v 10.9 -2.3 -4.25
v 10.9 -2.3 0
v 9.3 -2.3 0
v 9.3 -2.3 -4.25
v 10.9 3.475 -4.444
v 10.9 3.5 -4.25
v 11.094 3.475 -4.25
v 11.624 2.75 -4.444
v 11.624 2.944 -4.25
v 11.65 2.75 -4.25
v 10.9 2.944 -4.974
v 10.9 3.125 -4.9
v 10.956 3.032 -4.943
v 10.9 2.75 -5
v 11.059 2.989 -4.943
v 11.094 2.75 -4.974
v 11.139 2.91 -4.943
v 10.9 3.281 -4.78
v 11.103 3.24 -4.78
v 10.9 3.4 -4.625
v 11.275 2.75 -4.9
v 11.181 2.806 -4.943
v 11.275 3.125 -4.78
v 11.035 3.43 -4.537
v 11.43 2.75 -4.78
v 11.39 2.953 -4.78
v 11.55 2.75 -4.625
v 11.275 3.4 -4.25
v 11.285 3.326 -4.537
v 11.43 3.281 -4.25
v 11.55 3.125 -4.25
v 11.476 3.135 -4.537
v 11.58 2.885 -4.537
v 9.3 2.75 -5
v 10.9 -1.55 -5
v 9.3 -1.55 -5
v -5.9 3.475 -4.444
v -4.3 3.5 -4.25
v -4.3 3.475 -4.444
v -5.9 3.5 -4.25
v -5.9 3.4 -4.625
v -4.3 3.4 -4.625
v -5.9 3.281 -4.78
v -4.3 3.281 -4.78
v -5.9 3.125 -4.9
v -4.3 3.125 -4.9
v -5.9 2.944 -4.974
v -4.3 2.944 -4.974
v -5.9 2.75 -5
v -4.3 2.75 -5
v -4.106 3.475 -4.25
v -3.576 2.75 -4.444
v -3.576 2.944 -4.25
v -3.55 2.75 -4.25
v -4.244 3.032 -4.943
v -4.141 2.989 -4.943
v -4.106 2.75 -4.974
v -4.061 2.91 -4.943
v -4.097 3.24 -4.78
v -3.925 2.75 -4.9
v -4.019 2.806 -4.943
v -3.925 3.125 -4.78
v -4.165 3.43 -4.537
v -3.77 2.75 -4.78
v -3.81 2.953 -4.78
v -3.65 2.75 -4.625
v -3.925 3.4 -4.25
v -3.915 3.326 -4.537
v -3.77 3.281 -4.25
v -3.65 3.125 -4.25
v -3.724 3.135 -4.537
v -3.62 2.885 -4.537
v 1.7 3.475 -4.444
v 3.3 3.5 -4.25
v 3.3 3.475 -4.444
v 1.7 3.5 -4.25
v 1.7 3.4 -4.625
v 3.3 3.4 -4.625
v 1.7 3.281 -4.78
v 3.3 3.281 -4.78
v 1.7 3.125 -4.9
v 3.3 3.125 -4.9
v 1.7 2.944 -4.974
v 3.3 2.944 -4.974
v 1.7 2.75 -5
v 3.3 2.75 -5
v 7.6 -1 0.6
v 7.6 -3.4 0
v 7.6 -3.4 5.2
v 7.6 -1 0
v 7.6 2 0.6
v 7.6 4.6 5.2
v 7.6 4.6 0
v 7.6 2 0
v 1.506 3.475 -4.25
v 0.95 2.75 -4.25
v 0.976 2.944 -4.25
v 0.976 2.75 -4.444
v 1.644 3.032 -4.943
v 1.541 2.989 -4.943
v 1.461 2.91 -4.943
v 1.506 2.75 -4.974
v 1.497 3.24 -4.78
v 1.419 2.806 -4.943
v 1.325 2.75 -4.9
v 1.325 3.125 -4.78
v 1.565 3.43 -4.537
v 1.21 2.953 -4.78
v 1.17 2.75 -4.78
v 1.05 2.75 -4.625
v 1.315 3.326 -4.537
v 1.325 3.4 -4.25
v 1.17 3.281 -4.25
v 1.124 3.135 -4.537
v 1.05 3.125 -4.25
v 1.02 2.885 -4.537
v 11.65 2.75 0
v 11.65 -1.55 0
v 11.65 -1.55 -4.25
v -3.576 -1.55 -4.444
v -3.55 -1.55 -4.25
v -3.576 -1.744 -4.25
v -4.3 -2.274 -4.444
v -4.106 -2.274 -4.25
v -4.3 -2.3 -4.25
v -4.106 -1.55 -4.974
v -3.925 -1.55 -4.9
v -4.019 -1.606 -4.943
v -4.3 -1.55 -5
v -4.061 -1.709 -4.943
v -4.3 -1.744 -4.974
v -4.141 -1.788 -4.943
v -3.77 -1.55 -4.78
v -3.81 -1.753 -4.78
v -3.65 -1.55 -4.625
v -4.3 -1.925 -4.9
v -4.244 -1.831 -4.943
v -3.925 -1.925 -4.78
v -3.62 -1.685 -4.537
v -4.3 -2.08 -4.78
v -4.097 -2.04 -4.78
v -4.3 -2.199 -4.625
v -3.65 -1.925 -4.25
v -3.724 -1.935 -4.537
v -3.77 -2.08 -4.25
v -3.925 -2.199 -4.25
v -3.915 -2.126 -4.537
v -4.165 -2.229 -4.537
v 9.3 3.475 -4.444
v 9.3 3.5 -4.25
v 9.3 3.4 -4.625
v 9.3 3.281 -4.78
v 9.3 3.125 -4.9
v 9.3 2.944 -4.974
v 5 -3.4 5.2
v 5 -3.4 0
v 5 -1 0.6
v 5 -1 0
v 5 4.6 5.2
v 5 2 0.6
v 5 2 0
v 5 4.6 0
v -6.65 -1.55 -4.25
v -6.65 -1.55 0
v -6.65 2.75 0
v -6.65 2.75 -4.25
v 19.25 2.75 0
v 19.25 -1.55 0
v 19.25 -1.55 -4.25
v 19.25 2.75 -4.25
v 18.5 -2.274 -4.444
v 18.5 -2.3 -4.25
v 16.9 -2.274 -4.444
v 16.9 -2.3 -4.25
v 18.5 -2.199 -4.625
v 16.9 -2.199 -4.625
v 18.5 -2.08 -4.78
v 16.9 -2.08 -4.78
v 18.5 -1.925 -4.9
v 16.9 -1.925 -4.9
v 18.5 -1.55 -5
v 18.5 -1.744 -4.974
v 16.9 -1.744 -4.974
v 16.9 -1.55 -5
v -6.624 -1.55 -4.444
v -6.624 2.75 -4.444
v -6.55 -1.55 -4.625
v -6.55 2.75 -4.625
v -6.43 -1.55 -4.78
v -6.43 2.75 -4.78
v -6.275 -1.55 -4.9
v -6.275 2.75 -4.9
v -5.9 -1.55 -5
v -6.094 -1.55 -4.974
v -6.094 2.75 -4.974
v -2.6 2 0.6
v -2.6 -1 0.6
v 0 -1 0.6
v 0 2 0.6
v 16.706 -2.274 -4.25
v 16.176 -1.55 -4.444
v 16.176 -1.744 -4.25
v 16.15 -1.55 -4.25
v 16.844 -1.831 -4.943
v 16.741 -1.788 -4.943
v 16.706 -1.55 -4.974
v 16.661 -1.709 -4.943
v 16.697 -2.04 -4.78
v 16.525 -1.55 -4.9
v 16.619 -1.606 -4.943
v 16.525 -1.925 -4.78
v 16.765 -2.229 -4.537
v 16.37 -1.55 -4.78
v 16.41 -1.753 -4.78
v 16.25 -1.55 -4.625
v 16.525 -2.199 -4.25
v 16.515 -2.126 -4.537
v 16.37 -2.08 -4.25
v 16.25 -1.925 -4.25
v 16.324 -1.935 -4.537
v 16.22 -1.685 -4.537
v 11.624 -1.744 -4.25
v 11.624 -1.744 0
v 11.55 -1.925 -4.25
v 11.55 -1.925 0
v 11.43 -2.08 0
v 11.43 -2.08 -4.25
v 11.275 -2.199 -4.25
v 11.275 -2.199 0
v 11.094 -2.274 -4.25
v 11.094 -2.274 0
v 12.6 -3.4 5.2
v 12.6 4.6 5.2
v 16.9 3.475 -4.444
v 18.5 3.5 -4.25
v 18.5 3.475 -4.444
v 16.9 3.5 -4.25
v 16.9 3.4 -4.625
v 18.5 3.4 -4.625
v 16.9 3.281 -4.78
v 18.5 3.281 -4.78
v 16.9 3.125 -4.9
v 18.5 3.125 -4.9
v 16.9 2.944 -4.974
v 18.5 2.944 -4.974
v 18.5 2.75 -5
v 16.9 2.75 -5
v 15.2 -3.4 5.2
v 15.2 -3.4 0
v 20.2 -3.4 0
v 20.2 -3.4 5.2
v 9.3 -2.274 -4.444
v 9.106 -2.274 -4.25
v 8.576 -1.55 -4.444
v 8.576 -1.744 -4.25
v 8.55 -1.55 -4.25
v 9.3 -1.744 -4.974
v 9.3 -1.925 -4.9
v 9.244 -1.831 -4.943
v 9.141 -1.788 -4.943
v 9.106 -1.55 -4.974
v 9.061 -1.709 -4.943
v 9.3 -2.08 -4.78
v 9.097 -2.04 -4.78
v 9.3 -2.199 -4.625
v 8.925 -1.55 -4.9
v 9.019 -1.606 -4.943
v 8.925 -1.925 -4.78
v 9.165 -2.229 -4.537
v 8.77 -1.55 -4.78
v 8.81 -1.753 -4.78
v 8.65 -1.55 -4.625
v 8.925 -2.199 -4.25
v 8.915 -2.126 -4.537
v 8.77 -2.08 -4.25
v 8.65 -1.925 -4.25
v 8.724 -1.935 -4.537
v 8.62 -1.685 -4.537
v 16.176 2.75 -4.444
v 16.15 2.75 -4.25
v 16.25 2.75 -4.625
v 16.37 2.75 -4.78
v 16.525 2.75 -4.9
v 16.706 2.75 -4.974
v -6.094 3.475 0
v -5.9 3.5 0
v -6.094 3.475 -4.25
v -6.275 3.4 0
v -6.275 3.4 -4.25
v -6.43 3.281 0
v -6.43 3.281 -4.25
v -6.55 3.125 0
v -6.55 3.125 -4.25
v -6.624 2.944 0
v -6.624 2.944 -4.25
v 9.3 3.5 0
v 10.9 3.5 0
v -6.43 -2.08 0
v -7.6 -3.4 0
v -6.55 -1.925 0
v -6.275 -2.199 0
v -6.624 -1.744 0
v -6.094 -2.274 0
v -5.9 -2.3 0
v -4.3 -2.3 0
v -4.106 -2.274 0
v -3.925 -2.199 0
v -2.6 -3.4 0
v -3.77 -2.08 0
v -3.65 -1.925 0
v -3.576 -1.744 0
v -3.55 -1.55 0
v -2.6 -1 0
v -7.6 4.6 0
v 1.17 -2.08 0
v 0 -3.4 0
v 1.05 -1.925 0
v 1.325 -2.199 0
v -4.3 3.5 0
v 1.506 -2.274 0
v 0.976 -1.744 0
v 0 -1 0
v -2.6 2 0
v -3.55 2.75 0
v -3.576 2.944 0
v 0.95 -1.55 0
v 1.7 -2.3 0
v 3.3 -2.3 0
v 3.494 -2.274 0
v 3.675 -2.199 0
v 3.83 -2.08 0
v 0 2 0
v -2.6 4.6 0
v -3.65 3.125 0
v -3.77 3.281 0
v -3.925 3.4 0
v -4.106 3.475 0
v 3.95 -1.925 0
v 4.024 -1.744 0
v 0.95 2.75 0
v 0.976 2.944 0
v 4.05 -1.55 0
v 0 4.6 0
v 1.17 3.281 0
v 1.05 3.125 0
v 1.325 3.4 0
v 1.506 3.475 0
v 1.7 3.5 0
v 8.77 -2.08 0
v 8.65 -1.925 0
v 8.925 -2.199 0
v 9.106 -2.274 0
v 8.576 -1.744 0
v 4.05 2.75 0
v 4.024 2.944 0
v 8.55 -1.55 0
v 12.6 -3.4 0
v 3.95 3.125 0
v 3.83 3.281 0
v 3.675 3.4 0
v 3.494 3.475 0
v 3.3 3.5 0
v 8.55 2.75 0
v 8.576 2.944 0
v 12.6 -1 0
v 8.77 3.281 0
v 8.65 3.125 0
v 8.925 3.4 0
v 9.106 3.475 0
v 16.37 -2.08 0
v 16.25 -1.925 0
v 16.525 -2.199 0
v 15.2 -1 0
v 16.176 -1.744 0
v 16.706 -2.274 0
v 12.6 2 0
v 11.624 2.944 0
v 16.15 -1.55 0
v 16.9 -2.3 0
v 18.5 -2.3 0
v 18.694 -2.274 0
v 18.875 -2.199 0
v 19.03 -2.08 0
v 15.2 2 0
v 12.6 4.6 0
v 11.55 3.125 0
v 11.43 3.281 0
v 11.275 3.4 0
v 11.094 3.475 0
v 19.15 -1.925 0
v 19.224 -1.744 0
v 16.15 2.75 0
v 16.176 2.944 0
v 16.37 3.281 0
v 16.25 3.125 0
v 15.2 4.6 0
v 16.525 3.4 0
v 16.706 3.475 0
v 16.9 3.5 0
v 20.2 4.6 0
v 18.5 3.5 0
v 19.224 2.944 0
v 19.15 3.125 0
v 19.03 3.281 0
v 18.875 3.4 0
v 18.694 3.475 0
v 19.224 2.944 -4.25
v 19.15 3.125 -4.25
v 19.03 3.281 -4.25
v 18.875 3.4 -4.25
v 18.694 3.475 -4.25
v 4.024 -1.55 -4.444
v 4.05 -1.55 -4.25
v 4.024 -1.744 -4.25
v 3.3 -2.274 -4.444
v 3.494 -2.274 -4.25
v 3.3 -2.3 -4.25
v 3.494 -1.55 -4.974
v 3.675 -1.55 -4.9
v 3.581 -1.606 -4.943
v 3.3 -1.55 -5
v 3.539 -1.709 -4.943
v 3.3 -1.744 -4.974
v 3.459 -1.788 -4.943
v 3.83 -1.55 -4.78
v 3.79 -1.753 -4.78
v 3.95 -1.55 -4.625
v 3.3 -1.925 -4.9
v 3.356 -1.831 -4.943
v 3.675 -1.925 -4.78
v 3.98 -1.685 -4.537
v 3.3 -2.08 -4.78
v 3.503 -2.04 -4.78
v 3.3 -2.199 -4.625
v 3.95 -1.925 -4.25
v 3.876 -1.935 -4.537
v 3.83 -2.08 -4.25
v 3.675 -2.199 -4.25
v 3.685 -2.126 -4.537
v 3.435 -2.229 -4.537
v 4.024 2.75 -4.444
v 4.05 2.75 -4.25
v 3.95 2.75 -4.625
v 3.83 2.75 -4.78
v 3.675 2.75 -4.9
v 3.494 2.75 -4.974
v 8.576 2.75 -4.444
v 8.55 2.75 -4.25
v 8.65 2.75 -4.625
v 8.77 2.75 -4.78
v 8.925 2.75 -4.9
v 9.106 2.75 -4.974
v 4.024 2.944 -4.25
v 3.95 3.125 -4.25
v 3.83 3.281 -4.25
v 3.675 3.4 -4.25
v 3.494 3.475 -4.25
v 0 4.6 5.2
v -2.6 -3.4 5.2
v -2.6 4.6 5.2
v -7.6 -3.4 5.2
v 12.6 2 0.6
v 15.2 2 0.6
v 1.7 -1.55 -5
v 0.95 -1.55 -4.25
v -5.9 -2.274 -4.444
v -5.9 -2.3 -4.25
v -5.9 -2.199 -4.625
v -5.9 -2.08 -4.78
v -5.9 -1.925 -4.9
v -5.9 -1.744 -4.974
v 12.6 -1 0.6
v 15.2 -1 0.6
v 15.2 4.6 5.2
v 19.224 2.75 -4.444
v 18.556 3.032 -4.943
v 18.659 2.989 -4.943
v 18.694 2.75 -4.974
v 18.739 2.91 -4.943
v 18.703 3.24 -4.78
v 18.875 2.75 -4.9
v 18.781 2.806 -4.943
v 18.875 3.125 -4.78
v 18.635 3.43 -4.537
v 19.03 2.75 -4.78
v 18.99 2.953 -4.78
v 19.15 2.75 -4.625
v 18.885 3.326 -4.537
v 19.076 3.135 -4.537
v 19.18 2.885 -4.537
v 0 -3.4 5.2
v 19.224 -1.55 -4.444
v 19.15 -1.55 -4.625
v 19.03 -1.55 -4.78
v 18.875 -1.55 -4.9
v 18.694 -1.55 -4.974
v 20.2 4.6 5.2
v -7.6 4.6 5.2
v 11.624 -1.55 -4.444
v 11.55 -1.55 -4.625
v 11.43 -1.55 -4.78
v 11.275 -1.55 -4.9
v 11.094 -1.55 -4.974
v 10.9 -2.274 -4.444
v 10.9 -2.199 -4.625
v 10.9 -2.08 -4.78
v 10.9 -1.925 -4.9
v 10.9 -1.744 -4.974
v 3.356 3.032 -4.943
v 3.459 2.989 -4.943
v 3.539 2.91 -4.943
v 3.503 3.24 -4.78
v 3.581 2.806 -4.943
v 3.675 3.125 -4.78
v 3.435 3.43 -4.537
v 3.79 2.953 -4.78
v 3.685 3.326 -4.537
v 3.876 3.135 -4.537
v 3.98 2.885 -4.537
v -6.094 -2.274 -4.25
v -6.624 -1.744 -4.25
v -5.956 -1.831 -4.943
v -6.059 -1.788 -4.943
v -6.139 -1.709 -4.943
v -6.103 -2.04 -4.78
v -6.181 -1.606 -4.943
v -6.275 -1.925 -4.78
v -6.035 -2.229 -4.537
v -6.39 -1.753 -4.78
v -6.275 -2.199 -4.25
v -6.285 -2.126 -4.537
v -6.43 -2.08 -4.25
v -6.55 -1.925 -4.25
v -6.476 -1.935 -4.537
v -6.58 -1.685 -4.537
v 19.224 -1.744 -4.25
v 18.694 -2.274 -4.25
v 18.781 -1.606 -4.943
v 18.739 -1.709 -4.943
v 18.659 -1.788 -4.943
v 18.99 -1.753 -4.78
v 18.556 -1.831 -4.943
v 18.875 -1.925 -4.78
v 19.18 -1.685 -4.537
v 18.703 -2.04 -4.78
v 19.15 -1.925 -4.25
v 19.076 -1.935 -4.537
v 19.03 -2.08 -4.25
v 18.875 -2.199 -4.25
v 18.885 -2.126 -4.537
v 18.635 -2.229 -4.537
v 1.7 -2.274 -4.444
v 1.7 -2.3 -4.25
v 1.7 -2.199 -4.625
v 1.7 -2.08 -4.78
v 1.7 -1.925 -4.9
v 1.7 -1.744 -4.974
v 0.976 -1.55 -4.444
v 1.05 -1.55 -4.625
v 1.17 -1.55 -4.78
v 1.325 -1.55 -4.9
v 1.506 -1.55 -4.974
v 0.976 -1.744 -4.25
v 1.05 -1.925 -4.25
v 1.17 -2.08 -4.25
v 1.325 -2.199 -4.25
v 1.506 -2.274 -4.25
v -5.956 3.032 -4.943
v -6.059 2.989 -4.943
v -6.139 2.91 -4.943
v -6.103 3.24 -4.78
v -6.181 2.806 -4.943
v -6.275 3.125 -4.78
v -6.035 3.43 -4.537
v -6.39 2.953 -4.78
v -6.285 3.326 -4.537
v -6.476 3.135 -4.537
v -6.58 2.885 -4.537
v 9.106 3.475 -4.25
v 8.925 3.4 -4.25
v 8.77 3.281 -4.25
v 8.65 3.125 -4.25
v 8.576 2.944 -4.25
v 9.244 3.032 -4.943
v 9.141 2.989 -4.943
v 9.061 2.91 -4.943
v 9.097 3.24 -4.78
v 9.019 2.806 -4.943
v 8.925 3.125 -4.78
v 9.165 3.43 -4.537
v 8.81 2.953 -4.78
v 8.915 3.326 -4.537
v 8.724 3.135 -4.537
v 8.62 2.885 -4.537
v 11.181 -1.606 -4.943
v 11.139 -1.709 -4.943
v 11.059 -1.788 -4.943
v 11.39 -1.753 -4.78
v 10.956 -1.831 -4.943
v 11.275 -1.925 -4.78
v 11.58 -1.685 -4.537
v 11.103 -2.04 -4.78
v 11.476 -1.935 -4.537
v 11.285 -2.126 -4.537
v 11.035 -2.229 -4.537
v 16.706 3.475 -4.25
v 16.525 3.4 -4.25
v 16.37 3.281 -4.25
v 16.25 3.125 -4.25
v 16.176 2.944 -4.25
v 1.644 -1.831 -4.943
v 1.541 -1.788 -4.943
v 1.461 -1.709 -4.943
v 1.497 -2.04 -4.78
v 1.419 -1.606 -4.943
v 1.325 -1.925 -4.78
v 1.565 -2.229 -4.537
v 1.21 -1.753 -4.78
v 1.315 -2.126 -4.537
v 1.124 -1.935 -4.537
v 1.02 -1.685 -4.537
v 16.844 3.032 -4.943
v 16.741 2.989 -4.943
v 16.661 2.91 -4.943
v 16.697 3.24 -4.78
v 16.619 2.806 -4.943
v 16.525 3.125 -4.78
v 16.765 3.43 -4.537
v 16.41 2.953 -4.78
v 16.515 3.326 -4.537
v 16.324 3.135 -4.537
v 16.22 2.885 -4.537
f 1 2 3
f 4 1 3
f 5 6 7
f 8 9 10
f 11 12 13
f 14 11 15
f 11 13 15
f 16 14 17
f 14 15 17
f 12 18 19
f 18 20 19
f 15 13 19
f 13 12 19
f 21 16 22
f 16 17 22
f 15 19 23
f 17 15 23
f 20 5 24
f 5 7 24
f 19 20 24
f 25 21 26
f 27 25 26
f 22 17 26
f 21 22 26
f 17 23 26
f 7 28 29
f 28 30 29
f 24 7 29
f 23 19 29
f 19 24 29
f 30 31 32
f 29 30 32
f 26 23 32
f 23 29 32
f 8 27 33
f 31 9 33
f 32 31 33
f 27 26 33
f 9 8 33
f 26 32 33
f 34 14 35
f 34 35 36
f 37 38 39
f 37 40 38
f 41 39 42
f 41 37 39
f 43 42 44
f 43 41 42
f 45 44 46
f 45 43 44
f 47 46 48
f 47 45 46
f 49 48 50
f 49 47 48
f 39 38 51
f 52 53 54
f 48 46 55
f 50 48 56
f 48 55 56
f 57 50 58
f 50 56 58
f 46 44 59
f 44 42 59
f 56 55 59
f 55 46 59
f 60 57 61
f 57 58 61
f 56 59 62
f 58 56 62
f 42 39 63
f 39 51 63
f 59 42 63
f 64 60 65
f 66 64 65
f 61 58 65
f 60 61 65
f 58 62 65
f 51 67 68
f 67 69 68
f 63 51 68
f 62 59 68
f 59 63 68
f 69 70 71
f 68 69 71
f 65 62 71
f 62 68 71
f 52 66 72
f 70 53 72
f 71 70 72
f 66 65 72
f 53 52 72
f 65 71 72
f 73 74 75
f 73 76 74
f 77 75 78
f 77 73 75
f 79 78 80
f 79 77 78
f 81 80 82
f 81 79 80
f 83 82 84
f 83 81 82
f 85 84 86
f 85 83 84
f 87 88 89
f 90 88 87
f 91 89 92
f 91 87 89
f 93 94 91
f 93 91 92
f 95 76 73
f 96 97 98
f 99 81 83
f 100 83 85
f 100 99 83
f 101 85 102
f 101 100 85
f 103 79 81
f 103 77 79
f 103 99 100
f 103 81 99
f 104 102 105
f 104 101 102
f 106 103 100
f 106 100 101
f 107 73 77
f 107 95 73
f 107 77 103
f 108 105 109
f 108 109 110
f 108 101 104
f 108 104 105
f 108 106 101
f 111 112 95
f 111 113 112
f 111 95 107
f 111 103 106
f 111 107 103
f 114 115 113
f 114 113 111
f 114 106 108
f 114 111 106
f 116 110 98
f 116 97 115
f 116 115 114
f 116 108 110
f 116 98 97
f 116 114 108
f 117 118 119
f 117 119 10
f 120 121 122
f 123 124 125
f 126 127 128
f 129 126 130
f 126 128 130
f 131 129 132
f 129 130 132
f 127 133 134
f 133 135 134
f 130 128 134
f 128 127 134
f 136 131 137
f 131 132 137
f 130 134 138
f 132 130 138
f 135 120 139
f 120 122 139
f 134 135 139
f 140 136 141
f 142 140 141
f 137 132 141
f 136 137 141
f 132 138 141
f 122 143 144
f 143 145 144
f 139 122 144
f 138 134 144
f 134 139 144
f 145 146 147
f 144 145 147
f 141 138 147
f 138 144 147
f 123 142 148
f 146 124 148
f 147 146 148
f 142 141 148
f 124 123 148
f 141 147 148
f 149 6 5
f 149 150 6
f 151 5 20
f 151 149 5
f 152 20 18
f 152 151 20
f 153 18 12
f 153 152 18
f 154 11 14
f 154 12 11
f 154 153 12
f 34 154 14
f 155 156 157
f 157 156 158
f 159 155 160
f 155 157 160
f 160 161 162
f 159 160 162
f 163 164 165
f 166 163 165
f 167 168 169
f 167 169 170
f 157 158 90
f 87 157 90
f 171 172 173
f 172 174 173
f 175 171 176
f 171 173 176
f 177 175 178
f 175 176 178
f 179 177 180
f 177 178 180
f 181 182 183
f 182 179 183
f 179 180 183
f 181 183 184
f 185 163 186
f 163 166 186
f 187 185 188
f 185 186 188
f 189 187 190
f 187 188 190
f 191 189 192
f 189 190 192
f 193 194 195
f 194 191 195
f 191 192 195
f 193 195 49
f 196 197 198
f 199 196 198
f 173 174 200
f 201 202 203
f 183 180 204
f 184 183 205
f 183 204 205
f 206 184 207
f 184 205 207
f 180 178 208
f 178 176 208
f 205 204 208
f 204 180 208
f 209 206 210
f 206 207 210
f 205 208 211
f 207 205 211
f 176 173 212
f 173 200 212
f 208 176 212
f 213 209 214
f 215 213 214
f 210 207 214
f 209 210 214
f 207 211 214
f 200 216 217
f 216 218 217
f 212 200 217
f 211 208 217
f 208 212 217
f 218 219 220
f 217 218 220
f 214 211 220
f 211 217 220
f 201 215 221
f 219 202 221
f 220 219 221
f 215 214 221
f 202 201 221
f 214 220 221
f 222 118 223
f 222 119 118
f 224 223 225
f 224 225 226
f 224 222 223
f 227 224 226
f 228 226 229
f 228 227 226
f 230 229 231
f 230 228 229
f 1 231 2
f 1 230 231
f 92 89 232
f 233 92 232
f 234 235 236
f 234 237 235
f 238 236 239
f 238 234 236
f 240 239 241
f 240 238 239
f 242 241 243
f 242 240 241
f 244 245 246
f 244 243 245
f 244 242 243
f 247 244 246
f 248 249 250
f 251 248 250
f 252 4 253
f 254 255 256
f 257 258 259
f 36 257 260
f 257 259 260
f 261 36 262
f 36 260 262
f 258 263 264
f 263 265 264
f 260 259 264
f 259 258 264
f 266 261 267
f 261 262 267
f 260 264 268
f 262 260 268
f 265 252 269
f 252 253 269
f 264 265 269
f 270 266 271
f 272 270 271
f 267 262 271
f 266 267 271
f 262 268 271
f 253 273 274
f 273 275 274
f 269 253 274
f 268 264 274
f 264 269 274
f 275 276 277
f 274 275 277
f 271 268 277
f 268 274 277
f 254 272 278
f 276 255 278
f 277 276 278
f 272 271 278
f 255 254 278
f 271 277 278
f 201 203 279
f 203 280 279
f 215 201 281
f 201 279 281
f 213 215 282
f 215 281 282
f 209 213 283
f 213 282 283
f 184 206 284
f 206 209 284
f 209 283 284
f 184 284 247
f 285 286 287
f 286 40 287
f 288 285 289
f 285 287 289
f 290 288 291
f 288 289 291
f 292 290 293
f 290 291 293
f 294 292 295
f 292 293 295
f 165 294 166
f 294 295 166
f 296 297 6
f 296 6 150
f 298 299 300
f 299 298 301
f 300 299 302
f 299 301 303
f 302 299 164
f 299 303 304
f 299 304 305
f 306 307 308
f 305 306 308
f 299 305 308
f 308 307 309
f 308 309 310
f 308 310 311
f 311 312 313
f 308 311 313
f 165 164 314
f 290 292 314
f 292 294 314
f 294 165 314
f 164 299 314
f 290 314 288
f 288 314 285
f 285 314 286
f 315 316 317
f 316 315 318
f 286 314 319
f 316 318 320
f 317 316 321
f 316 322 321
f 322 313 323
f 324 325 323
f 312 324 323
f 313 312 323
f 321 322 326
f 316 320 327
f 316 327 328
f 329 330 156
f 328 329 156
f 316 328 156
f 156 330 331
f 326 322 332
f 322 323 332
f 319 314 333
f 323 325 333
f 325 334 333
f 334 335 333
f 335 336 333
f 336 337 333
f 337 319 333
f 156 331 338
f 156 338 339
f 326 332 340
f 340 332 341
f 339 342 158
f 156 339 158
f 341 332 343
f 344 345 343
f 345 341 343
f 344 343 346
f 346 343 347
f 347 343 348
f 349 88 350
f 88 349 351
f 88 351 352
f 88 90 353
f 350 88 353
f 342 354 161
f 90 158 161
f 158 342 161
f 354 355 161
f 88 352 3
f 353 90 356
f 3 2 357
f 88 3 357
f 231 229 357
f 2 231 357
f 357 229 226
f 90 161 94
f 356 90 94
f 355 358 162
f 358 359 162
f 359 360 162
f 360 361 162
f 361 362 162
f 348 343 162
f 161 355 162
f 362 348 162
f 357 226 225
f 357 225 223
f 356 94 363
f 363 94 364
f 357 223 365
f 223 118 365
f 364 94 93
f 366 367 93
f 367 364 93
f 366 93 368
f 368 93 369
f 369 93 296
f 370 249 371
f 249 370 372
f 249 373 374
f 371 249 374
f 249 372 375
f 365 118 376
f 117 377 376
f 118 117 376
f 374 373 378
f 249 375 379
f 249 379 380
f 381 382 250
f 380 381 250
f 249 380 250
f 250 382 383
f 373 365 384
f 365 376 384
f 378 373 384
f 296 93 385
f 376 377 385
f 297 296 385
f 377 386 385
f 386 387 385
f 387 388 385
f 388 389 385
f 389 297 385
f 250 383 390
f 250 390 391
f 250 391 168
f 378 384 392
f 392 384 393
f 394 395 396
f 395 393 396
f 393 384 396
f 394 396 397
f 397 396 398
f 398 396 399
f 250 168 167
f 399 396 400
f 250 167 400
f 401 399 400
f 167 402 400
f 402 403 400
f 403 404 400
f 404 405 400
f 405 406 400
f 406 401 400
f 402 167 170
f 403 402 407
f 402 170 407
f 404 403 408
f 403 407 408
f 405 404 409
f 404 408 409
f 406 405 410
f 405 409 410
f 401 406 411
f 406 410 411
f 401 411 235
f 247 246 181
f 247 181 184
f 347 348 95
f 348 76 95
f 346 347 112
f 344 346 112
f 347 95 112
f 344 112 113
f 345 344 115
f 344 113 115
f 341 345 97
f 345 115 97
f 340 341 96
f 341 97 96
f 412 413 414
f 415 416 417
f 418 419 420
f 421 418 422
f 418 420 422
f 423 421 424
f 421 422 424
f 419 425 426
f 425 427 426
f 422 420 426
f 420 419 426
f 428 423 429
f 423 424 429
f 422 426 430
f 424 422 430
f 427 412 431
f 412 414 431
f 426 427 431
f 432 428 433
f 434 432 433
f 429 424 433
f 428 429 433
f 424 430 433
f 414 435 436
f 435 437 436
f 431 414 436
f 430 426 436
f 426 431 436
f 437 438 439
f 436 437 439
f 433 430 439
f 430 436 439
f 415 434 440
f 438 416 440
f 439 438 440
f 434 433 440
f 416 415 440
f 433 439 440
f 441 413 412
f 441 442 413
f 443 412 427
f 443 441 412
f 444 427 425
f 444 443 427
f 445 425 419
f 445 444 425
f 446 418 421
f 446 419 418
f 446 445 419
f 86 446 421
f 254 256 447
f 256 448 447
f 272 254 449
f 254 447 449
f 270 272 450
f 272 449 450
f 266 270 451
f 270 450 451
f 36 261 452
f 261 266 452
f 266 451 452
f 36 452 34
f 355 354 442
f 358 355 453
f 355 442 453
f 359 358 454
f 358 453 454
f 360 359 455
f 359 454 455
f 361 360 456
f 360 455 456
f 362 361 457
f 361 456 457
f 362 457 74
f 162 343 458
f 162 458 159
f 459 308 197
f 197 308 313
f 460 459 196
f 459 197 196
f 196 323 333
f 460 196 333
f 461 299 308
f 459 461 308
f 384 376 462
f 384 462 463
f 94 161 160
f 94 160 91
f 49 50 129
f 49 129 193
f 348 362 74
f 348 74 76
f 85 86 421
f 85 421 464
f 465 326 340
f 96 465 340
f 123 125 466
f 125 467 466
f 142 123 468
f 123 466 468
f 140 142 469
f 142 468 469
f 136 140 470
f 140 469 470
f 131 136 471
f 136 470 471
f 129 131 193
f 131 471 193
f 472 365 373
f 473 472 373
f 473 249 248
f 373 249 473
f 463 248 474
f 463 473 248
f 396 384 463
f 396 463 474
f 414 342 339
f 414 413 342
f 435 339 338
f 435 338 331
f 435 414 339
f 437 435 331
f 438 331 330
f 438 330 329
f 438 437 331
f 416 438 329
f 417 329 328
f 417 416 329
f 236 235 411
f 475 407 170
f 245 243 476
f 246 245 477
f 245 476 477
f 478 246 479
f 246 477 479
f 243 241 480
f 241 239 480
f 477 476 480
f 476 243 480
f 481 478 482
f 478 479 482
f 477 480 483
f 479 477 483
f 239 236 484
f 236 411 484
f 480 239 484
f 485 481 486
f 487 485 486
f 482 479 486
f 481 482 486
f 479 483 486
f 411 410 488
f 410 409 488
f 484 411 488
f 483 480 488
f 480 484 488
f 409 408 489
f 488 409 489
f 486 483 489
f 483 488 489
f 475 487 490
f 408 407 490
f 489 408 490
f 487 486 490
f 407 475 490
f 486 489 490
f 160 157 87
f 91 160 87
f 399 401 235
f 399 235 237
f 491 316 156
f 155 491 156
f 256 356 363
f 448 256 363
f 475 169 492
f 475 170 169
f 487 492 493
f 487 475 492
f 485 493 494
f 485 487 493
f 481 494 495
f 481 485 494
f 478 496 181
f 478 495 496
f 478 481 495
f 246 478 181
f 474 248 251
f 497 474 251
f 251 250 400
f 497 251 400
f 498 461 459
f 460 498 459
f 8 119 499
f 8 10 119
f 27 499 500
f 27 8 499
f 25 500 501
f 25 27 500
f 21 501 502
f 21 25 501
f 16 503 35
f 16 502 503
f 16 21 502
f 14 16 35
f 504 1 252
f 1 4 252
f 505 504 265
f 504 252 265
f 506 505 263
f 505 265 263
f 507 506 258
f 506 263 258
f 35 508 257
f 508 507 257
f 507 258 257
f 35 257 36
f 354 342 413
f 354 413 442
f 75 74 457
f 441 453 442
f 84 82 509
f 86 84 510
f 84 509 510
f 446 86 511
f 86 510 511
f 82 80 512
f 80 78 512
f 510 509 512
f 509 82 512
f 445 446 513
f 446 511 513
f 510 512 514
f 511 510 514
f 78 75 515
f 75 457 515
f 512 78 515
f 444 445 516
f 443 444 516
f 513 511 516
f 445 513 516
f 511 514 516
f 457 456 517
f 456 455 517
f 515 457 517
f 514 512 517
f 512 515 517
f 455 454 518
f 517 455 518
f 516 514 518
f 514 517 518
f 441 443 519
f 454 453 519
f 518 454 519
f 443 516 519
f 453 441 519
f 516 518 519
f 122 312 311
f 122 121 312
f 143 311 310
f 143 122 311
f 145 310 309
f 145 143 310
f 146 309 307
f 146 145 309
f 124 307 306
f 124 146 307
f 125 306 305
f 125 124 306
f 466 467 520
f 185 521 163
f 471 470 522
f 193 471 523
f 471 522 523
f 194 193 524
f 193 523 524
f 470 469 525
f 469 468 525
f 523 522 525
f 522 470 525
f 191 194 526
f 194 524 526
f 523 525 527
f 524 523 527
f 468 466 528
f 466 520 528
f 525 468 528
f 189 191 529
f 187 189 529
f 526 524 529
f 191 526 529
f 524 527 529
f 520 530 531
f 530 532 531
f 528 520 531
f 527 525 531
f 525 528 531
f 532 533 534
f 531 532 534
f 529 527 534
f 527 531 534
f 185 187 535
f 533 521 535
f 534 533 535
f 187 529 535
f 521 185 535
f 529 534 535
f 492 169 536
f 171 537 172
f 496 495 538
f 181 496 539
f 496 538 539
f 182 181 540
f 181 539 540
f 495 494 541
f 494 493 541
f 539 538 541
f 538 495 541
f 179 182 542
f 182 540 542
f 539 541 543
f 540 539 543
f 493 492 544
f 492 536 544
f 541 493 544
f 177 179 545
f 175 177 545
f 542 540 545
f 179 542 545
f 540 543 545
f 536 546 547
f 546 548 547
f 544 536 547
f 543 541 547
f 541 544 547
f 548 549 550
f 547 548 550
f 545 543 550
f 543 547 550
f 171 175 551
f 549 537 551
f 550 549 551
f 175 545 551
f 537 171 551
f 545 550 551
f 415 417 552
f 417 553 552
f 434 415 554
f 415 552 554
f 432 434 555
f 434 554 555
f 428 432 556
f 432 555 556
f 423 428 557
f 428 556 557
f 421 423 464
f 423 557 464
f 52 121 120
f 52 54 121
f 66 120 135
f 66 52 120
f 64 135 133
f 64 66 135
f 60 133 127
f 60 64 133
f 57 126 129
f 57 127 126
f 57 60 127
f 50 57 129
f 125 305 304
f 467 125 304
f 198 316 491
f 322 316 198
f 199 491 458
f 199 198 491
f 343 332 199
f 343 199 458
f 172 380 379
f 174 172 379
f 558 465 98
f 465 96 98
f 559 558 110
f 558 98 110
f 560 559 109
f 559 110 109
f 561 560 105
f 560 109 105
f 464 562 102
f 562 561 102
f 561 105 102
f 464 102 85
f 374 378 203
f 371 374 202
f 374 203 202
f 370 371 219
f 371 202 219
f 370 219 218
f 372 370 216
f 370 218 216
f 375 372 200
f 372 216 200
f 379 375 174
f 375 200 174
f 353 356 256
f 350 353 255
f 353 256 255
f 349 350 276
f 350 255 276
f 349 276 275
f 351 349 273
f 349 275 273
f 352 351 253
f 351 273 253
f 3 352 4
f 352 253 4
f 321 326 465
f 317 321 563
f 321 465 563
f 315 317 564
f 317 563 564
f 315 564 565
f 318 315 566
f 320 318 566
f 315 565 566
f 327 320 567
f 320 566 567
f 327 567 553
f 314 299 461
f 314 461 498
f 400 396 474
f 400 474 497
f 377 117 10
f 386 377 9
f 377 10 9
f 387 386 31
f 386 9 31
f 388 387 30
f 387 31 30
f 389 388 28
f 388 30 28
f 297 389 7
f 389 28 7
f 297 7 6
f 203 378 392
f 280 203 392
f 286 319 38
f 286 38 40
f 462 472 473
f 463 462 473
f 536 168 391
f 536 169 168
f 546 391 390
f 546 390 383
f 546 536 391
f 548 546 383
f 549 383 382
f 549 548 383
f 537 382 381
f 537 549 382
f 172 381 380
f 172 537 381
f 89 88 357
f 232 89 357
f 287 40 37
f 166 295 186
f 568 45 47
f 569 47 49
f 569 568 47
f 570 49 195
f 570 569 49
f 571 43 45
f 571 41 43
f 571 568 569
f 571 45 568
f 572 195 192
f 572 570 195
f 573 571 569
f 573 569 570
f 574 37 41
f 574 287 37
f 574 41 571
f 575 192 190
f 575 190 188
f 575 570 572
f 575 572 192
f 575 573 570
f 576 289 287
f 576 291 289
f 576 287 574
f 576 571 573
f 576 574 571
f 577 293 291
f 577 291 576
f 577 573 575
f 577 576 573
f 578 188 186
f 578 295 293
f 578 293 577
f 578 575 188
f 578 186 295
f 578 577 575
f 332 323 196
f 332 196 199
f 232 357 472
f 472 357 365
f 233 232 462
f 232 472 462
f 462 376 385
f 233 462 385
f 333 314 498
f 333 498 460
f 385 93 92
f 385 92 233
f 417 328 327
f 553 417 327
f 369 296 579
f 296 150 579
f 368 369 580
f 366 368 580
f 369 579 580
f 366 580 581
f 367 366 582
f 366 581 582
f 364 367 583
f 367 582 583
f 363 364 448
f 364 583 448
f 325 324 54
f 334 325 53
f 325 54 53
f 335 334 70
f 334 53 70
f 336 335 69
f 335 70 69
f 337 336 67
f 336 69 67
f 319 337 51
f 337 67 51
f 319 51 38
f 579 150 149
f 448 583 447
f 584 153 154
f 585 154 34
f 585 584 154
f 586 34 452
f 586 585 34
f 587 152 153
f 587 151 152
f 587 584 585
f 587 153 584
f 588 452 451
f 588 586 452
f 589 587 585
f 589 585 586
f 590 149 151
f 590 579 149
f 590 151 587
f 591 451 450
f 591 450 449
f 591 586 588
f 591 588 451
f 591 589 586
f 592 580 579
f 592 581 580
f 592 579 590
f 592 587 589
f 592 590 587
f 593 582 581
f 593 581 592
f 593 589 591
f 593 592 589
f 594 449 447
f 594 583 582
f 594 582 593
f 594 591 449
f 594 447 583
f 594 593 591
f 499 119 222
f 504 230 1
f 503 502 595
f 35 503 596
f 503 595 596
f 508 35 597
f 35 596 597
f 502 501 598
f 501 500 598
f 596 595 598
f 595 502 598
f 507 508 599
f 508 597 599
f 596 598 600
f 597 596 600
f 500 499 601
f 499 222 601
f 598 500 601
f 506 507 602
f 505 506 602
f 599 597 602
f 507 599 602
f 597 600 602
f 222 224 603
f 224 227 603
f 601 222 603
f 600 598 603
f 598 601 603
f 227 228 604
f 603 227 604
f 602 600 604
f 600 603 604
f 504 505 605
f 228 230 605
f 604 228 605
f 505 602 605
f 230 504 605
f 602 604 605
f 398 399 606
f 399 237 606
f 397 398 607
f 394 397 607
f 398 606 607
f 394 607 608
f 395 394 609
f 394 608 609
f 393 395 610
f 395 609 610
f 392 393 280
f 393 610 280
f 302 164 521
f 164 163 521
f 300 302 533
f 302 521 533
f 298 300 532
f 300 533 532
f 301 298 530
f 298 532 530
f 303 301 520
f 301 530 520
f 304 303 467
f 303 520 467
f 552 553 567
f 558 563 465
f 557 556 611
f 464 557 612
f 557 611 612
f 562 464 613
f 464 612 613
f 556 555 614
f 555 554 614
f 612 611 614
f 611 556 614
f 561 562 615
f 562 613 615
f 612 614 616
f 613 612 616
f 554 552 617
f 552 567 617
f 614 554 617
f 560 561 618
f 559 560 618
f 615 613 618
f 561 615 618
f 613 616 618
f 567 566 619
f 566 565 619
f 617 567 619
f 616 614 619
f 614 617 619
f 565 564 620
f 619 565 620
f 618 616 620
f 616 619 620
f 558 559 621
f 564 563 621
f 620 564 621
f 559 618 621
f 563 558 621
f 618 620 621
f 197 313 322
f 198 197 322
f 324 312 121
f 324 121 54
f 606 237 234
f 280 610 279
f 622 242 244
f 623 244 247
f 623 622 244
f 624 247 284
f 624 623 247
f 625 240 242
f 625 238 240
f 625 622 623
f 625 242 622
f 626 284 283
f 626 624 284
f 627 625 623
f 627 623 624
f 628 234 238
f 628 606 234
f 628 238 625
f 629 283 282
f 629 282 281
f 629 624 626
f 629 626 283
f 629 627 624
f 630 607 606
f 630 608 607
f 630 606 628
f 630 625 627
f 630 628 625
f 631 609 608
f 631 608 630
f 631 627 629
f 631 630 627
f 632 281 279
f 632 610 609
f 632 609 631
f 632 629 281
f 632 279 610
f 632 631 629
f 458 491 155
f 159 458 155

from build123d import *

# Parameters (mm, degrees)
SKETCH_1_W           = 5
SKETCH_1_H           = 8
EXTRUDE_1_DEPTH      = 5.2
EXTRUDE_1_2_DEPTH    = 5.2
EXTRUDE_1_3_DEPTH    = 5.2
EXTRUDE_1_4_DEPTH    = 5.2
SKETCH_2_W           = 3.1
SKETCH_2_H           = 5.8
EXTRUDE_2_DEPTH      = 5
EXTRUDE_3_DEPTH      = 2
EXTRUDE_3_DEPTH_BACK = 1
SKETCH_3_W           = 2.6
SKETCH_3_H           = 0.6
FILLET_1_R           = 0.75


with BuildPart() as part:
    # 草图1 → 凸台-拉伸1 (new body)
    with BuildSketch(Plane.XY):
        with Locations((2.5, 0.600266138)):
            Rectangle(SKETCH_1_W, SKETCH_1_H)
    extrude(amount=EXTRUDE_1_DEPTH)



with BuildPart() as body_2:
    # 草图1 → Extrude 1 2 (new body)
    with BuildSketch(Plane.XY):
        with Locations((-5.1, 0.600266138)):
            Rectangle(SKETCH_1_W, SKETCH_1_H)
    extrude(amount=EXTRUDE_1_2_DEPTH)


with BuildPart() as body_3:
    # 草图1 → Extrude 1 3 (new body)
    with BuildSketch(Plane.XY):
        with Locations((10.1, 0.600266138)):
            Rectangle(SKETCH_1_W, SKETCH_1_H)
    extrude(amount=EXTRUDE_1_3_DEPTH)


with BuildPart() as body_4:
    # 草图1 → Extrude 1 4 (new body)
    with BuildSketch(Plane.XY):
        with Locations((17.7, 0.600266138)):
            Rectangle(SKETCH_1_W, SKETCH_1_H)
    extrude(amount=EXTRUDE_1_4_DEPTH)


with BuildPart() as part_1:
    add(part.part)

    add(body_2.part)  # 凸台-拉伸2 merges body 2

    add(body_3.part)  # 凸台-拉伸2 merges body 3

    add(body_4.part)  # 凸台-拉伸2 merges body 4
    # 草图2 → 凸台-拉伸2 (add)
    with BuildSketch(Plane(origin=(0, 0, 0), x_dir=(-1, 0, 0), z_dir=(0, 0, -1))):
        with Locations((-17.7, 0.600266138)):
            Rectangle(SKETCH_2_W, SKETCH_2_H)
        with Locations((-10.1, 0.600266138)):
            Rectangle(SKETCH_2_W, SKETCH_2_H)
        with Locations((-2.5, 0.600266138)):
            Rectangle(SKETCH_2_W, SKETCH_2_H)
        with Locations((5.1, 0.600266138)):
            Rectangle(SKETCH_2_W, SKETCH_2_H)
    extrude(amount=EXTRUDE_2_DEPTH)

    # 草图3 → 凸台-拉伸3 (add, two sides: drawn at the far end of the back side and taken through both)
    with BuildSketch(Plane(origin=(0, 0, 0), x_dir=(1, 0, 0), z_dir=(0, 1, 0)).offset(-EXTRUDE_3_DEPTH_BACK)):
        with Locations((-1.3, -0.3)):
            Rectangle(SKETCH_3_W, SKETCH_3_H)
        with Locations((6.3, -0.3)):
            Rectangle(SKETCH_3_W, SKETCH_3_H)
        with Locations((13.9, -0.3)):
            Rectangle(SKETCH_3_W, SKETCH_3_H)
    extrude(amount=EXTRUDE_3_DEPTH + EXTRUDE_3_DEPTH_BACK)

    # 圆角1
    fillet_1_edges = [part_1.edges().sort_by_distance(p)[0] for p in [
        (16.15, 3.500266138, -2.5),
        (19.25, 3.500266138, -2.5),
        (19.25, -2.299733862, -2.5),
        (16.15, -2.299733862, -2.5),
        (17.7, 3.500266138, -5),
        (19.25, 0.600266138, -5),
        (17.7, -2.299733862, -5),
        (16.15, 0.600266138, -5),
        (-6.65, 3.500266138, -2.5),
        (-3.55, 3.500266138, -2.5),
        (-3.55, -2.299733862, -2.5),
        (-6.65, -2.299733862, -2.5),
        (-5.1, 3.500266138, -5),
        (-3.55, 0.600266138, -5),
        (-5.1, -2.299733862, -5),
        (-6.65, 0.600266138, -5),
        (0.95, 3.500266138, -2.5),
        (4.05, 3.500266138, -2.5),
        (4.05, -2.299733862, -2.5),
        (0.95, -2.299733862, -2.5),
        (2.5, 3.500266138, -5),
        (4.05, 0.600266138, -5),
        (2.5, -2.299733862, -5),
        (0.95, 0.600266138, -5),
        (8.55, 3.500266138, -2.5),
        (11.65, 3.500266138, -2.5),
        (11.65, -2.299733862, -2.5),
        (8.55, -2.299733862, -2.5),
        (10.1, 3.500266138, -5),
        (11.65, 0.600266138, -5),
        (10.1, -2.299733862, -5),
        (8.55, 0.600266138, -5),
    ]]
    fillet(fillet_1_edges, radius=FILLET_1_R)


solid = part_1.part
